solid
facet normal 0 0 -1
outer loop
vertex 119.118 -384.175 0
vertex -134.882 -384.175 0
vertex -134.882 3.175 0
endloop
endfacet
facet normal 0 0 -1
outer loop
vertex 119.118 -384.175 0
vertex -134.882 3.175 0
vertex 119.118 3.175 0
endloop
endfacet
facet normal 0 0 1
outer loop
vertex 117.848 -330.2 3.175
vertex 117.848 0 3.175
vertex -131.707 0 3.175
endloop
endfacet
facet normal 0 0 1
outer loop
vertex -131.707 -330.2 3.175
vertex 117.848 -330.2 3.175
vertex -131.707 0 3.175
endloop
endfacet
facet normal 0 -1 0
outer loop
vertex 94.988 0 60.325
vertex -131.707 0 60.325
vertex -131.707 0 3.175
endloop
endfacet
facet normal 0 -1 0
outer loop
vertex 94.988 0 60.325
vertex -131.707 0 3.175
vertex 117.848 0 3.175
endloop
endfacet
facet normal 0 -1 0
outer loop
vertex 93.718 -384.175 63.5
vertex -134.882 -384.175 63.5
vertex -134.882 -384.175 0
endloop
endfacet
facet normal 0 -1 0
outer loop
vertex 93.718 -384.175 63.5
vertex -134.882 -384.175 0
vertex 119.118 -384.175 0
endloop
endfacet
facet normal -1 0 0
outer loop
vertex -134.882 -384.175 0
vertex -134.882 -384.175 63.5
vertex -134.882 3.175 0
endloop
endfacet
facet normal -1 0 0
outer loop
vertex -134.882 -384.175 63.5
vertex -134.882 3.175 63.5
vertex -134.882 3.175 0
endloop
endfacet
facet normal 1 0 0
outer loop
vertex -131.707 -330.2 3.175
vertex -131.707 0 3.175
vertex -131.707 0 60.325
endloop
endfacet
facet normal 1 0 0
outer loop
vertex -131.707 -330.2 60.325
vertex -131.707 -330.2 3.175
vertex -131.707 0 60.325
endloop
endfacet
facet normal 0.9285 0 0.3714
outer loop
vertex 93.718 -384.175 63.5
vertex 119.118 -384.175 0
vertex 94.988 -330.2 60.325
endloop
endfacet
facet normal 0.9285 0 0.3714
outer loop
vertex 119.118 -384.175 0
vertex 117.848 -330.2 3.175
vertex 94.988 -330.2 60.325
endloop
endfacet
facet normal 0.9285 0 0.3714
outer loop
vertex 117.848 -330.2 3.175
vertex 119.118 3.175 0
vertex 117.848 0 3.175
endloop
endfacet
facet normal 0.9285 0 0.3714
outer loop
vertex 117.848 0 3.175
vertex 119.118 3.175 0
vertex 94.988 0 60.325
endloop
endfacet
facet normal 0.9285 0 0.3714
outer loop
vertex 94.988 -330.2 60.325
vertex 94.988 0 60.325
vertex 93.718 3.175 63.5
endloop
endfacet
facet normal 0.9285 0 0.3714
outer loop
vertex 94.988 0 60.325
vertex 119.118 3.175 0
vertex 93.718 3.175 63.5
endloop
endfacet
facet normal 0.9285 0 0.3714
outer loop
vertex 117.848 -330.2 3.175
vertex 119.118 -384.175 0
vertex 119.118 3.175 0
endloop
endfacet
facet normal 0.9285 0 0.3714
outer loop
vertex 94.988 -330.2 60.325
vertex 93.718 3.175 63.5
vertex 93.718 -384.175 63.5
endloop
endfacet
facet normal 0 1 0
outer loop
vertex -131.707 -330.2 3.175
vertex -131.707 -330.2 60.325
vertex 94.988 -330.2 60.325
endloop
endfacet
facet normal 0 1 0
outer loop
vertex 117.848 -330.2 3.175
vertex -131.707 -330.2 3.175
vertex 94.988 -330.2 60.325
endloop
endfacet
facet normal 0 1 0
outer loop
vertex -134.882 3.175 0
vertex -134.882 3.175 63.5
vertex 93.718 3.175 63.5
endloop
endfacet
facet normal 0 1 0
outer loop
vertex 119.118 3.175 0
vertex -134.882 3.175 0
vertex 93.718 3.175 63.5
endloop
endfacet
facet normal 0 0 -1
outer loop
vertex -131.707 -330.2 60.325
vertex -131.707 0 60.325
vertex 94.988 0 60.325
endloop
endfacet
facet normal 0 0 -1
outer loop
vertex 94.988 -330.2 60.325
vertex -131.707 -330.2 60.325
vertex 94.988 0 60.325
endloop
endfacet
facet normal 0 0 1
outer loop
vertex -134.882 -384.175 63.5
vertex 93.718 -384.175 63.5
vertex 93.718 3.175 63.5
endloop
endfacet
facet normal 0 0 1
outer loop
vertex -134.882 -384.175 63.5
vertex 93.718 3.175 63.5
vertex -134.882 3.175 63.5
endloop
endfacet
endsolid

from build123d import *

# Parameters (mm, degrees)
F1_DEPTH = 330.2
F2_DEPTH = 3.175
F4_DEPTH = 53.975


with BuildPart() as f1:
    # F0 (on Front) → F1 (new body)
    with BuildSketch(Plane.XZ):
        Polygon((-134.881878, 63.5), (-134.881878, 0), (119.118122, 0), (117.848122, 3.175), (-131.706878, 3.175), (-131.706878, 60.325), (94.988122, 60.325), (93.718122, 63.5), align=None)
    extrude(amount=F1_DEPTH)

    # F0 (on Front) → F2 (join)
    with BuildSketch(Plane.XZ):
        Polygon((-131.706878, 3.175), (117.848122, 3.175), (94.988122, 60.325), (-131.706878, 60.325), align=None)
        Polygon((-134.881878, 63.5), (-134.881878, 0), (119.118122, 0), (117.848122, 3.175), (-131.706878, 3.175), (-131.706878, 60.325), (94.988122, 60.325), (93.718122, 63.5), align=None)
    extrude(amount=-F2_DEPTH)

    # F3 (on face) → F4 (join)
    with BuildSketch(Plane.XZ.offset(330.2)):
        Polygon((117.848122, 3.175), (94.988122, 60.325), (-131.706878, 60.325), (-131.706878, 3.175), align=None)
        Polygon((94.988122, 60.325), (93.718122, 63.5), (-134.881878, 63.5), (-134.881878, 0), (119.118122, 0), (117.848122, 3.175), (-131.706878, 3.175), (-131.706878, 60.325), align=None)
    extrude(amount=F4_DEPTH)


solid = f1.part
